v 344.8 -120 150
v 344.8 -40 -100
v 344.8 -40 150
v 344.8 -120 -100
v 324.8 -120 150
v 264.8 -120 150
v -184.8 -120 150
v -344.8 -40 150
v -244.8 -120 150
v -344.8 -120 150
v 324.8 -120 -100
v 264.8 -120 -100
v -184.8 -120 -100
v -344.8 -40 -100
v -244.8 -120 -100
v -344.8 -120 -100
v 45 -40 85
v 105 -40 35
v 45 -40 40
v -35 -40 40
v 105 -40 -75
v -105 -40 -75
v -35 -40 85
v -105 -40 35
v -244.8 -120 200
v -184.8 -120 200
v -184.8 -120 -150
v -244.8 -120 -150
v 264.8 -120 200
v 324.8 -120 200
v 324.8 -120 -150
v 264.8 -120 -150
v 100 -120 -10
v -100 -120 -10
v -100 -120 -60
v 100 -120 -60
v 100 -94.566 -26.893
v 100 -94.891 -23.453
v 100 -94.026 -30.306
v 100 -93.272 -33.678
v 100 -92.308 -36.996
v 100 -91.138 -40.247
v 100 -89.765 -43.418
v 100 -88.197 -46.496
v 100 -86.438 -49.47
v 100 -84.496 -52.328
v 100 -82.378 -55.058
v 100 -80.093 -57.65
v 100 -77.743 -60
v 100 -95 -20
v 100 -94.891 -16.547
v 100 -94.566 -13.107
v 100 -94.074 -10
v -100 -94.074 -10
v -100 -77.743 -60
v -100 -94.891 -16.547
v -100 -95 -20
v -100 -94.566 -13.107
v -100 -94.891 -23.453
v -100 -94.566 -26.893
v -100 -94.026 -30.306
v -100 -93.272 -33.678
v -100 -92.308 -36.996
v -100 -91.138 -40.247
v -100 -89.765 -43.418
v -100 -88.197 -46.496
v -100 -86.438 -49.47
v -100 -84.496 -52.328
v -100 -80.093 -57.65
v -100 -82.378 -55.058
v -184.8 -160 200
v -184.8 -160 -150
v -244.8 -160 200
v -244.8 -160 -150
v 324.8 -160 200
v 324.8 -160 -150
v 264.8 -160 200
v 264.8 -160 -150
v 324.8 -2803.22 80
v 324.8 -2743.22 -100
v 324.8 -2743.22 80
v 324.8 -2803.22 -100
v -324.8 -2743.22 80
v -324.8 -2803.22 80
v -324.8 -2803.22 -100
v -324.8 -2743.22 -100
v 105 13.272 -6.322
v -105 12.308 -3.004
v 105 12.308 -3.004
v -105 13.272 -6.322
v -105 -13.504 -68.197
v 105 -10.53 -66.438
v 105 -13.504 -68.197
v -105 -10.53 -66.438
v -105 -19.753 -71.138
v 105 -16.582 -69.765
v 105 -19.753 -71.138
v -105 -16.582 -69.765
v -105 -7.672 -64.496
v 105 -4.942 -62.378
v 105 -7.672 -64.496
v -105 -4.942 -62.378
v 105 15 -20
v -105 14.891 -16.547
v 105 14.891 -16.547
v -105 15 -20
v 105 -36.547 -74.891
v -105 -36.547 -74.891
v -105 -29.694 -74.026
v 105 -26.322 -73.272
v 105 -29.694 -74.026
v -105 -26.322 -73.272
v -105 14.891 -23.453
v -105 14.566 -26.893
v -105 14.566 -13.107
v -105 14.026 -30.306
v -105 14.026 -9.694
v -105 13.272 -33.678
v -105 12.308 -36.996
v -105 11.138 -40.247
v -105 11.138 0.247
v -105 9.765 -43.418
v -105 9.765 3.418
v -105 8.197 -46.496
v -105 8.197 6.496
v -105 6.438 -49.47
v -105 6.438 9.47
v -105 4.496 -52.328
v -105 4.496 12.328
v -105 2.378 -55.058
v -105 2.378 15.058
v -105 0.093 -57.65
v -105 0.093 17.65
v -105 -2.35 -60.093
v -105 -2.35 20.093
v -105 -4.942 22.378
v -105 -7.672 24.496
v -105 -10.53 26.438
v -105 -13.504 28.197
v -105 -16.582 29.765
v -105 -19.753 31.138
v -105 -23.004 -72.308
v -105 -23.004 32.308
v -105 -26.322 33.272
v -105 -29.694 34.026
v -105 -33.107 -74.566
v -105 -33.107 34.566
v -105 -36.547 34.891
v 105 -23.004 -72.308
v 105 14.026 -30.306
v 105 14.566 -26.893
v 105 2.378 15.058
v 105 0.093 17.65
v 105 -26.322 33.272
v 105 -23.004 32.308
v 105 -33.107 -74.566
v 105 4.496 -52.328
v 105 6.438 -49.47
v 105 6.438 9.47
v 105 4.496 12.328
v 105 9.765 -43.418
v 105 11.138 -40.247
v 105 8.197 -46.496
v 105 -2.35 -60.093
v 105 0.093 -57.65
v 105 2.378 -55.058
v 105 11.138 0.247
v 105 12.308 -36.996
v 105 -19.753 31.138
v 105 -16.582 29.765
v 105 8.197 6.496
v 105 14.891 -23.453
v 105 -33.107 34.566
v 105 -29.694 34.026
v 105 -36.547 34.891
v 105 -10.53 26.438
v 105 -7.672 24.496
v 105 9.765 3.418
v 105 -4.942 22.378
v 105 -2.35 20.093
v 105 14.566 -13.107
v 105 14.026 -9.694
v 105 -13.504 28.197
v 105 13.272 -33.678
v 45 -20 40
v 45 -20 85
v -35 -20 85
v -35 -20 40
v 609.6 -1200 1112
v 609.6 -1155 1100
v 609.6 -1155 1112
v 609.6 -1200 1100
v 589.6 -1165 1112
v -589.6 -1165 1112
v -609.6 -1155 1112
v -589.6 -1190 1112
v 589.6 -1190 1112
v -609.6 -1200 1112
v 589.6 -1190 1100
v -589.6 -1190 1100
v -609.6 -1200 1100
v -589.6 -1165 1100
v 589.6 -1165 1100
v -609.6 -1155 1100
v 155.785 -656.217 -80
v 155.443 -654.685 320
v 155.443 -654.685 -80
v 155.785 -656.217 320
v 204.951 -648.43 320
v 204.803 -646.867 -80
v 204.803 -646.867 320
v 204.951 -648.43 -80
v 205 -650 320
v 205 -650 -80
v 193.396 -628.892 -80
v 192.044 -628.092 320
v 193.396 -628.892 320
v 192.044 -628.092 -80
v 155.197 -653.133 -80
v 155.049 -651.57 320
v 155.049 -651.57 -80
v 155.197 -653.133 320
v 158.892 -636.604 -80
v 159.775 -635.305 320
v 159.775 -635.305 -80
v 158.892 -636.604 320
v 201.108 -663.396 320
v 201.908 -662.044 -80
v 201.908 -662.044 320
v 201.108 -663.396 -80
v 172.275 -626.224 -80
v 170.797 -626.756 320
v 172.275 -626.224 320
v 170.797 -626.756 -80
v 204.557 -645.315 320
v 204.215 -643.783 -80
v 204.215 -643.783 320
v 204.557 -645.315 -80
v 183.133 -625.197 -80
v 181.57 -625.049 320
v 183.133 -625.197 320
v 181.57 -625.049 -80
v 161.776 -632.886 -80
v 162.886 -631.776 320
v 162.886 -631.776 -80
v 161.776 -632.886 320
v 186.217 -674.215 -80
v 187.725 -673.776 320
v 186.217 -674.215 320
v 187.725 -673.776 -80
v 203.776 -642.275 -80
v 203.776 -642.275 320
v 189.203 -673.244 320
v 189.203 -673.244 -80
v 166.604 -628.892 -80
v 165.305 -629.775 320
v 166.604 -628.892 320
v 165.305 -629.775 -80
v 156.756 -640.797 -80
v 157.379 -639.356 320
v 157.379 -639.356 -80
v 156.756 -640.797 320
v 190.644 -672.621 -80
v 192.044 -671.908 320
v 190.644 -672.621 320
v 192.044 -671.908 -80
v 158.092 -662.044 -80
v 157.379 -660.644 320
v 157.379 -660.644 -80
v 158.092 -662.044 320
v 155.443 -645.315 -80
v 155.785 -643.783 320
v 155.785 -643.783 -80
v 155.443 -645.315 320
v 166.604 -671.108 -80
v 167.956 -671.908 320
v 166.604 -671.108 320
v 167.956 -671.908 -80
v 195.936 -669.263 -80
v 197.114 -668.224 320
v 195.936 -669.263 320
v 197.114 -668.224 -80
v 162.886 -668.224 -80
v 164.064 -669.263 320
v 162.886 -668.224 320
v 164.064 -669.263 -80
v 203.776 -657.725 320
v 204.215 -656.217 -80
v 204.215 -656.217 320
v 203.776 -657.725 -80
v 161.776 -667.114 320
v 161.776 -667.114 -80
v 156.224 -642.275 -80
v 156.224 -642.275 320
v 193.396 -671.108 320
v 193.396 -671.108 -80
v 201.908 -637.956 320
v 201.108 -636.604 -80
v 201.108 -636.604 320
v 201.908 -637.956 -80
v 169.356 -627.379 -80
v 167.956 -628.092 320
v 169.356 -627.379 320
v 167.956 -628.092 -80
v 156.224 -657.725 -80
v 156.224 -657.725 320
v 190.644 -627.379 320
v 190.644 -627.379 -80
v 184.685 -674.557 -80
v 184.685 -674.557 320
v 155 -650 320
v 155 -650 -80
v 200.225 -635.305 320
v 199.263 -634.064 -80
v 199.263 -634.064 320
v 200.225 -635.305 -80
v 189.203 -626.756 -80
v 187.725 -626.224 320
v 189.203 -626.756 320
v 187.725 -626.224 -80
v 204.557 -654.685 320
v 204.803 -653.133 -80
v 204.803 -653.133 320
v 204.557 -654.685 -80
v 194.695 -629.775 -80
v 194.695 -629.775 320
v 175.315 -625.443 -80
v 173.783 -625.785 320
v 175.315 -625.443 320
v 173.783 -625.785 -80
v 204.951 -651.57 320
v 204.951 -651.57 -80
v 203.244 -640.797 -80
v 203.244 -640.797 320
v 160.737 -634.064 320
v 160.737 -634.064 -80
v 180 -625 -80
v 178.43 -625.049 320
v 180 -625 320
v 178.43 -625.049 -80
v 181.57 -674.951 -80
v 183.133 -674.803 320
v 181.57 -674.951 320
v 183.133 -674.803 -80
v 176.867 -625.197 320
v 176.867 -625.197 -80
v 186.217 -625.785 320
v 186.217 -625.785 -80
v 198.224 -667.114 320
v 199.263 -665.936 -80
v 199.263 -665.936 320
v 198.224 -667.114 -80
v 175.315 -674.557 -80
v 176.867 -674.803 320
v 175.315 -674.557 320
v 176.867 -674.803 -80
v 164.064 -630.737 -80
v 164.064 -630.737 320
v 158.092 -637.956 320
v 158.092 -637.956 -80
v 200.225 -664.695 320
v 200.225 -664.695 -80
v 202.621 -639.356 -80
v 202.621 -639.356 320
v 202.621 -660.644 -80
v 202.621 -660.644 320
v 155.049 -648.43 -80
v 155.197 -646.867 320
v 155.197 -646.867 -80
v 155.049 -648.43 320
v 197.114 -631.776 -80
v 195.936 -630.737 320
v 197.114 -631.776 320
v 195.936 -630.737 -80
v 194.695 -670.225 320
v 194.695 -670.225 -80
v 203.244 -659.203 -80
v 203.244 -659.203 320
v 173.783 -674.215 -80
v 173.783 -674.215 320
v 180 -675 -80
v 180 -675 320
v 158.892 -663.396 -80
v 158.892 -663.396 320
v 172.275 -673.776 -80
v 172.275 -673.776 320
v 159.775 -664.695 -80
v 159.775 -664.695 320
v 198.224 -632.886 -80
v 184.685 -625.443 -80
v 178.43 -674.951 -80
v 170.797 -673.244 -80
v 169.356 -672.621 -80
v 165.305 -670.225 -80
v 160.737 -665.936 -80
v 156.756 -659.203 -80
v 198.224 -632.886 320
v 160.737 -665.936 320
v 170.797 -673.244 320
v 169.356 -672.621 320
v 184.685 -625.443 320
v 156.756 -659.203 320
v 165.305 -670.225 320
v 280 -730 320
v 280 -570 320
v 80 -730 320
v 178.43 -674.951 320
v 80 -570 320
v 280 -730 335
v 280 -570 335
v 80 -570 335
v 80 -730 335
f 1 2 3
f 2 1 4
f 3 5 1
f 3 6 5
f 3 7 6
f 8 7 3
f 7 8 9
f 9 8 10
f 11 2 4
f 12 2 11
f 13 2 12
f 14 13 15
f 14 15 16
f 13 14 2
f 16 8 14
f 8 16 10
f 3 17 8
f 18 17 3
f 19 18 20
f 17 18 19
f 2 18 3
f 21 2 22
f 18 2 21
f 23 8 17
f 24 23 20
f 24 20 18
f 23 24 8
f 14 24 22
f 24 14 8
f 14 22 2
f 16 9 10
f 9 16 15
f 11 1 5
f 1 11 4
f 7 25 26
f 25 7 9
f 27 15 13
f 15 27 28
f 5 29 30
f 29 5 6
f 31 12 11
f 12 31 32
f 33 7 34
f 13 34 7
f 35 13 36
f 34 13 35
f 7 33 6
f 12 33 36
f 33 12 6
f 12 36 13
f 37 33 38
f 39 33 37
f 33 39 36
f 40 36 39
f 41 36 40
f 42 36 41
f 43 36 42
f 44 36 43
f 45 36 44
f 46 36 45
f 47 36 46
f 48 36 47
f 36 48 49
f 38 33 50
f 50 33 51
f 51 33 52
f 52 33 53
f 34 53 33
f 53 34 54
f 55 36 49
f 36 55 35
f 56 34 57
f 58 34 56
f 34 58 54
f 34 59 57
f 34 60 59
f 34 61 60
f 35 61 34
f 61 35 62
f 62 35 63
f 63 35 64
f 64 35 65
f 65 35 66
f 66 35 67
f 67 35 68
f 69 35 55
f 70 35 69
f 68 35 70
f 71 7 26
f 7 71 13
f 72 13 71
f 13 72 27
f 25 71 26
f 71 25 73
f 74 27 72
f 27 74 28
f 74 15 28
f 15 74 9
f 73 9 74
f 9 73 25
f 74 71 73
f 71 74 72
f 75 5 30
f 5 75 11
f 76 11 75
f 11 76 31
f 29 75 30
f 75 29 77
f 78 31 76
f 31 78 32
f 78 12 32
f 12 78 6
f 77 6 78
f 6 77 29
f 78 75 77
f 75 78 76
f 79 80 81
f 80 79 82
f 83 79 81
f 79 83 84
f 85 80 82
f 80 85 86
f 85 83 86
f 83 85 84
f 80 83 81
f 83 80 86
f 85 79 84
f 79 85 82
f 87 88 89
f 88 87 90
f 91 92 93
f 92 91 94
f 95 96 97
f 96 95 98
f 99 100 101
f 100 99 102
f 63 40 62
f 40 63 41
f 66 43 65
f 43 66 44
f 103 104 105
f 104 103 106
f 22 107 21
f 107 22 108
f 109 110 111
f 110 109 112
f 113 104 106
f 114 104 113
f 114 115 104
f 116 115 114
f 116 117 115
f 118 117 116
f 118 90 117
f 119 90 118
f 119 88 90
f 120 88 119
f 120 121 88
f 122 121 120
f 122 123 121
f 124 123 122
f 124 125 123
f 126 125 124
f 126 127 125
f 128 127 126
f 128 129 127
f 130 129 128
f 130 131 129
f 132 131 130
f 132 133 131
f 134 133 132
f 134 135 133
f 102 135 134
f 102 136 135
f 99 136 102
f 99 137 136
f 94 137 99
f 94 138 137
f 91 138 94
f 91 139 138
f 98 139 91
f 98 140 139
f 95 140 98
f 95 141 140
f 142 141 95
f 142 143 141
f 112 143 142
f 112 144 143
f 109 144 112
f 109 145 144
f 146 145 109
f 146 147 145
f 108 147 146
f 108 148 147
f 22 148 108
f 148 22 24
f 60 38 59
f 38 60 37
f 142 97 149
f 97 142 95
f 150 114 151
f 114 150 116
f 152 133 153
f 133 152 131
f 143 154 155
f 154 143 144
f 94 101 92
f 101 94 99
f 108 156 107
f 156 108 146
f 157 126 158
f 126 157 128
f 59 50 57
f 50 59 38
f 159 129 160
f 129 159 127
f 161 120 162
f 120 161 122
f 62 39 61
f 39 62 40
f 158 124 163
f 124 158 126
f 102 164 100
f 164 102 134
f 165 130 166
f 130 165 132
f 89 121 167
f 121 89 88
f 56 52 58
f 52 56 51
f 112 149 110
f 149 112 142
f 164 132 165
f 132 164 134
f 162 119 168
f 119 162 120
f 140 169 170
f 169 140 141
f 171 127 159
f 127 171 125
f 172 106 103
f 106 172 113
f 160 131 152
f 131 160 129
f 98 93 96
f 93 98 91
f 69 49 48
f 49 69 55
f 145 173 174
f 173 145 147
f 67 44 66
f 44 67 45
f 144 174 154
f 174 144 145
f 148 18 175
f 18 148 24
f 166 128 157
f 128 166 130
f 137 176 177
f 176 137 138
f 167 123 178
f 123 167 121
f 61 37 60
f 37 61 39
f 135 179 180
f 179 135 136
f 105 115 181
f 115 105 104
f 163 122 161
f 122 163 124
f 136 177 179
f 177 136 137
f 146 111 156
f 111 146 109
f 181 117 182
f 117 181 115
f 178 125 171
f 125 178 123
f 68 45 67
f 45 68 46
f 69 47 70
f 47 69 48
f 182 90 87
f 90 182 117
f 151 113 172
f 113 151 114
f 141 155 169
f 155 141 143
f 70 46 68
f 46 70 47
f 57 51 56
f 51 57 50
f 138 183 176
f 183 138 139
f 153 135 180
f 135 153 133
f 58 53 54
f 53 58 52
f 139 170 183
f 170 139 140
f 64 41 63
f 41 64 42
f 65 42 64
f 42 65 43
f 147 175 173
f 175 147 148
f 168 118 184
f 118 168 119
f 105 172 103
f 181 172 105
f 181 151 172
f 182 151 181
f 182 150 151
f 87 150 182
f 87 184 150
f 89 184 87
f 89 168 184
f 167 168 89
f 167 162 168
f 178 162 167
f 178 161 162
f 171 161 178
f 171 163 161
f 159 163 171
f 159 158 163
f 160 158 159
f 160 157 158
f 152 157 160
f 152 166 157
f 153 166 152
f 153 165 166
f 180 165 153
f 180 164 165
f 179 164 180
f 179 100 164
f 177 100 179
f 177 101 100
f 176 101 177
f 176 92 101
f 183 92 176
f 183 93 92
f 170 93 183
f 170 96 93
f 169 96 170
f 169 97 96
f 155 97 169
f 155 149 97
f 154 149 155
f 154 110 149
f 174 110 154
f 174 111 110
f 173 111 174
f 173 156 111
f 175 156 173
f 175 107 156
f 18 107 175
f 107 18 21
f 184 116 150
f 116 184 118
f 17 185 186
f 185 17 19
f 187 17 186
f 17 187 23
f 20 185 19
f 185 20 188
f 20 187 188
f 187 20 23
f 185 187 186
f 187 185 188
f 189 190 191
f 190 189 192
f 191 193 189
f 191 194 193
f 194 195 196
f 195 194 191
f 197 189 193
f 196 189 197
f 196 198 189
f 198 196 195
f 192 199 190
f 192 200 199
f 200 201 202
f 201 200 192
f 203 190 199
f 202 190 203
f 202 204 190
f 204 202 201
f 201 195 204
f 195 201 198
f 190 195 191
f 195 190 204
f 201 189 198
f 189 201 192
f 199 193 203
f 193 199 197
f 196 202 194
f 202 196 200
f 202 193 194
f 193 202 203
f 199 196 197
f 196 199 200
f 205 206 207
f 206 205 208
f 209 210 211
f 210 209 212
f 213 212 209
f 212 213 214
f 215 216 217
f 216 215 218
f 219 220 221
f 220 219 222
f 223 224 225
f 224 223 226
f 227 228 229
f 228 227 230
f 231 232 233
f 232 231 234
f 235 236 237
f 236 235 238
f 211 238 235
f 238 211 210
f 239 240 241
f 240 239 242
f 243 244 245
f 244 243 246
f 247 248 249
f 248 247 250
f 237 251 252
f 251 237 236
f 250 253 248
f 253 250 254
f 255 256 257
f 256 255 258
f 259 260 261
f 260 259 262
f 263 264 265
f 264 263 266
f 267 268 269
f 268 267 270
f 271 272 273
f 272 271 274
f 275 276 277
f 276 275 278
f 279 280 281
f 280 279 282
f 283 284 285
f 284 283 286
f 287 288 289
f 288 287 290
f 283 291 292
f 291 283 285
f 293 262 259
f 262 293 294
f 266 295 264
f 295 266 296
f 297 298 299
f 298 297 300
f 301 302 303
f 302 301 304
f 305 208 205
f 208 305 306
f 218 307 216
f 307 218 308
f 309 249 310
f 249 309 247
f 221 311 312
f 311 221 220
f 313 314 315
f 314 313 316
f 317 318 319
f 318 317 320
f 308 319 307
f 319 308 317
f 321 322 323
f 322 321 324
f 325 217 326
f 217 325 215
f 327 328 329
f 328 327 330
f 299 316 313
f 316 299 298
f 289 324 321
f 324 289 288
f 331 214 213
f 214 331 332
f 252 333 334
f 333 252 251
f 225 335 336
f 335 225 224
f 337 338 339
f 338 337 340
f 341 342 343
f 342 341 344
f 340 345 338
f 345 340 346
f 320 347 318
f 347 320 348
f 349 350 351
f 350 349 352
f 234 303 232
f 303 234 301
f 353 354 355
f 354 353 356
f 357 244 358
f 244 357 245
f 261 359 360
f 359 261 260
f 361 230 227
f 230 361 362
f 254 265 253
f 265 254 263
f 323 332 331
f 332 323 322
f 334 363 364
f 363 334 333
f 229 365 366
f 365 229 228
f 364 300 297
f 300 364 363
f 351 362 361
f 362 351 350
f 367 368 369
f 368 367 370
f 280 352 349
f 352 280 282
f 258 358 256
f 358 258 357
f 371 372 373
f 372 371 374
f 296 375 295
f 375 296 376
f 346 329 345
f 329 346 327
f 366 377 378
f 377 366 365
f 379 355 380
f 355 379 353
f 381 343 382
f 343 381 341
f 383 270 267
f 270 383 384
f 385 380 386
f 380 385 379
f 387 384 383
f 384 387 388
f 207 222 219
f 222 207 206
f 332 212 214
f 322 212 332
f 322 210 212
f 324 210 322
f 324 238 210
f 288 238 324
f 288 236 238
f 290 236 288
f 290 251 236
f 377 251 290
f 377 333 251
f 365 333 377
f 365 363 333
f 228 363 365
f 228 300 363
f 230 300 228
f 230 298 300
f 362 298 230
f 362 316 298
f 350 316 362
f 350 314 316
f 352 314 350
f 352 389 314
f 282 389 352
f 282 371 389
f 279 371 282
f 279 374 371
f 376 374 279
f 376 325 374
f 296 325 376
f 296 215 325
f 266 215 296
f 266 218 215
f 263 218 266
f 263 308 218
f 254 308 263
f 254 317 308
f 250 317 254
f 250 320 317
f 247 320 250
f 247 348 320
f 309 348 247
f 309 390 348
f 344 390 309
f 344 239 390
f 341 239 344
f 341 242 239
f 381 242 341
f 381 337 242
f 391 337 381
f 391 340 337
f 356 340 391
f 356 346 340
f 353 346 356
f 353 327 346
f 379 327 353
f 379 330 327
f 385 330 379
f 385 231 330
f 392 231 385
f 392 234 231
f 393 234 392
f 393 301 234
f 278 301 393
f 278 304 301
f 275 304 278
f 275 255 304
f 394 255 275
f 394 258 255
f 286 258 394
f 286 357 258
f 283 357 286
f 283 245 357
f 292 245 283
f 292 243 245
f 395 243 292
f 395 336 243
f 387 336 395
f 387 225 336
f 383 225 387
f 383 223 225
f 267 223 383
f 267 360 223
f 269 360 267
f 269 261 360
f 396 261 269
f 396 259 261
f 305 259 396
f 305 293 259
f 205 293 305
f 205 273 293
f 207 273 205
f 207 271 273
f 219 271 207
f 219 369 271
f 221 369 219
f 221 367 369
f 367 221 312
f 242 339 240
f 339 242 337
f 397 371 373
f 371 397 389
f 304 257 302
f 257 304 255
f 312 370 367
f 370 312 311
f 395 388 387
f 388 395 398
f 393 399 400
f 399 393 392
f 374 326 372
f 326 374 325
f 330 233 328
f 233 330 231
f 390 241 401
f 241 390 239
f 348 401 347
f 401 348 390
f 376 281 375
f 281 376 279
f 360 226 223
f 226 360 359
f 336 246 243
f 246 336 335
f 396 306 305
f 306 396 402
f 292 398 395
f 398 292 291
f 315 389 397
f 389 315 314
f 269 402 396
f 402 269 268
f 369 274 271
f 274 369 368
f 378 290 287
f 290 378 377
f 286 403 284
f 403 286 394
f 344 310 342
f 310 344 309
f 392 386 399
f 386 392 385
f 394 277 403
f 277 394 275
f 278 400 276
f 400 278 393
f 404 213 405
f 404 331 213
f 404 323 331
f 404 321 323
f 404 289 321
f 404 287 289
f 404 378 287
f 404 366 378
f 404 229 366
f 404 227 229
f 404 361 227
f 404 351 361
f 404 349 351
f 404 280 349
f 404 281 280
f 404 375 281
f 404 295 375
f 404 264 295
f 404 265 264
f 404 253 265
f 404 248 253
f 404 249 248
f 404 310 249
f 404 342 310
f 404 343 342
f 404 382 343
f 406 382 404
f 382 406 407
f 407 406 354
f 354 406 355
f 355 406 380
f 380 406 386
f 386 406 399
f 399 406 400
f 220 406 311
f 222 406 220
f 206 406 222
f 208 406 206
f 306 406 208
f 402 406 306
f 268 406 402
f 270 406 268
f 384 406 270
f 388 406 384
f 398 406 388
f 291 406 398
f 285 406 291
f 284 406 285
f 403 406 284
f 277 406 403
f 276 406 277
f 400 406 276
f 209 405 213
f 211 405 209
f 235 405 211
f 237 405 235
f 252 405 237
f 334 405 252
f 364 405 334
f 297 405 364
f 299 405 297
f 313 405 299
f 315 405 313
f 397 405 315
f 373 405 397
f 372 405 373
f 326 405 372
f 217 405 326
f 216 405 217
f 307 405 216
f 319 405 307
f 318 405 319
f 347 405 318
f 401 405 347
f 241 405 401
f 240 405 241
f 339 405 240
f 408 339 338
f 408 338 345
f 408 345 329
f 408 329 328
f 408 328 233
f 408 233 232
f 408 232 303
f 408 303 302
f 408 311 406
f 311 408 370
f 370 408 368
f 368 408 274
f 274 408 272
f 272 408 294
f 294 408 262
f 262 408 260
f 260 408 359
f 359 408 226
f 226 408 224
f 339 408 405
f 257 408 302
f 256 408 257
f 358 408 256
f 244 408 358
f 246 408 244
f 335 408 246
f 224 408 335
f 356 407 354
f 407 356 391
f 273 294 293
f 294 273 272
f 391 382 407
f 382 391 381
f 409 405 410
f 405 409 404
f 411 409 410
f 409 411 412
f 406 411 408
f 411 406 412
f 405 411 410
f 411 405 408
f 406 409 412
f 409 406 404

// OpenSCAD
// ====================================================================================
// REVOLUTIONARY TECHNOLOGY COMPANY & UNIVERSITY OF WASHINGTON DEPARTMENT OF PHYSICS
// Subsystem: copo_police_hardware.scad (Tactical Police Pursuit Mechanical Array)
// Core Objective: Structural frame-mount armor, recovery winches, and rooftop light bars
// Center Origin (0,0,0) = Mid-point of Front Frame Crossmember Structural Face
// ====================================================================================

$fn = 100; // High-precision CNC cutting and welding profile resolution

// --- Engineering Constants (mm) ---
inch_to_mm         = 25.4;
frame_width_span   = 24.0  * inch_to_mm; // 609.6 mm track width
wheelbase_total    = 114.3 * inch_to_mm; // 2903.22 mm chassis length
tube_thickness_mm  = 6.00;               // Heavy-duty reinforced structural steel plate

// Auxiliary Electronic Footprints
lightbar_length    = 48.0 * inch_to_mm;  // Roof tracking emergency light bar width
winch_drum_width   = 210.00;             // 12,000-lb heavy electric extraction winch spool

module front_and_rear_push_bumpers() {
    echo("COMPILING FRONT AND REAR PURSUIT ARMOR OVERLAYS");
    // 1. FRONT INTERCEPTOR PUSH BUMPER (Bolts straight to front frame horn tabs)
    color("Black") {
        translate([-frame_width_span/2 - 40, -120, -100]) {
            difference() {
                // Main horizontal push beam faceplate
                cube([frame_width_span + 80, 80, 250]);
                // Cutout window passage for the winch line fairlead guide rollers
                translate([frame_width_span/2 + 40 - 100, -1, 40])
                    cube([200, 82, 50]);
            }
            // Left vertical pushing vertical ram tooth
            translate([100, -40, -50]) cube([60, 40, 350]);
            // Right vertical pushing vertical ram tooth
            translate([frame_width_span, -40, -50]) cube([60, 40, 350]);
        }
    }
    
    // 2. REAR RAM REINFORCEMENT BUMPER (Protects fuel cell during high-speed PIT maneuvers)
    color("DarkSlateGrey") {
        translate([-frame_width_span/2 - 20, -wheelbase_total + 100, -100])
            cube([frame_width_span + 40, 60, 180]);
    }
}

module integrated_frame_winch() {
    // 12,000-lb extraction winch nested deep within the front frame crossmember cavity
    color("DimGrey") {
        translate([-winch_drum_width/2, -40, -20]) {
            // Main high-torque planetary gearbox motor drum cylinder
            rotate([0, 90, 0])
                cylinder(d=110, h=winch_drum_width);
            // Electronic control solenoid terminal pack box
            translate([winch_drum_width/3, -30, 60])
                cube([80, 50, 45]);
        }
    }
}

module tactical_hardware_mounts() {
    // 3. ROOFTOP LIGHT BAR MOUNTING FLANGES: Anchors straight onto the roll cage roof halo
    color("Silver") {
        translate([-lightbar_length/2, -1200, 1100]) // Positioned at 1969 roof apex height
            difference() {
                cube([lightbar_length, 45, 12]);
                translate([20, 10, -1]) cube([lightbar_length - 40, 25, 14]); // Weight relief channel
            }
    }
    
    // 4. COCKPIT COMPUTER STAND PEDESTAL: Heavy dual-swivel post anchored to transmission tunnel frame
    color("LightGrey") {
        translate([180, -650, -80]) { // Positioned in passenger footwell section
            cylinder(d=50, h=400); // Main support pillar pipe
            translate([-100, -80, 400])
                cube([200, 160, 15]); // Standard 10" x 8" laptop/terminal display tray base
        }
    }
}

// --- Composite Tactical System Instantiation ---
union() {
    front_and_rear_push_bumpers();
    integrated_frame_winch();
    tactical_hardware_mounts();
}
